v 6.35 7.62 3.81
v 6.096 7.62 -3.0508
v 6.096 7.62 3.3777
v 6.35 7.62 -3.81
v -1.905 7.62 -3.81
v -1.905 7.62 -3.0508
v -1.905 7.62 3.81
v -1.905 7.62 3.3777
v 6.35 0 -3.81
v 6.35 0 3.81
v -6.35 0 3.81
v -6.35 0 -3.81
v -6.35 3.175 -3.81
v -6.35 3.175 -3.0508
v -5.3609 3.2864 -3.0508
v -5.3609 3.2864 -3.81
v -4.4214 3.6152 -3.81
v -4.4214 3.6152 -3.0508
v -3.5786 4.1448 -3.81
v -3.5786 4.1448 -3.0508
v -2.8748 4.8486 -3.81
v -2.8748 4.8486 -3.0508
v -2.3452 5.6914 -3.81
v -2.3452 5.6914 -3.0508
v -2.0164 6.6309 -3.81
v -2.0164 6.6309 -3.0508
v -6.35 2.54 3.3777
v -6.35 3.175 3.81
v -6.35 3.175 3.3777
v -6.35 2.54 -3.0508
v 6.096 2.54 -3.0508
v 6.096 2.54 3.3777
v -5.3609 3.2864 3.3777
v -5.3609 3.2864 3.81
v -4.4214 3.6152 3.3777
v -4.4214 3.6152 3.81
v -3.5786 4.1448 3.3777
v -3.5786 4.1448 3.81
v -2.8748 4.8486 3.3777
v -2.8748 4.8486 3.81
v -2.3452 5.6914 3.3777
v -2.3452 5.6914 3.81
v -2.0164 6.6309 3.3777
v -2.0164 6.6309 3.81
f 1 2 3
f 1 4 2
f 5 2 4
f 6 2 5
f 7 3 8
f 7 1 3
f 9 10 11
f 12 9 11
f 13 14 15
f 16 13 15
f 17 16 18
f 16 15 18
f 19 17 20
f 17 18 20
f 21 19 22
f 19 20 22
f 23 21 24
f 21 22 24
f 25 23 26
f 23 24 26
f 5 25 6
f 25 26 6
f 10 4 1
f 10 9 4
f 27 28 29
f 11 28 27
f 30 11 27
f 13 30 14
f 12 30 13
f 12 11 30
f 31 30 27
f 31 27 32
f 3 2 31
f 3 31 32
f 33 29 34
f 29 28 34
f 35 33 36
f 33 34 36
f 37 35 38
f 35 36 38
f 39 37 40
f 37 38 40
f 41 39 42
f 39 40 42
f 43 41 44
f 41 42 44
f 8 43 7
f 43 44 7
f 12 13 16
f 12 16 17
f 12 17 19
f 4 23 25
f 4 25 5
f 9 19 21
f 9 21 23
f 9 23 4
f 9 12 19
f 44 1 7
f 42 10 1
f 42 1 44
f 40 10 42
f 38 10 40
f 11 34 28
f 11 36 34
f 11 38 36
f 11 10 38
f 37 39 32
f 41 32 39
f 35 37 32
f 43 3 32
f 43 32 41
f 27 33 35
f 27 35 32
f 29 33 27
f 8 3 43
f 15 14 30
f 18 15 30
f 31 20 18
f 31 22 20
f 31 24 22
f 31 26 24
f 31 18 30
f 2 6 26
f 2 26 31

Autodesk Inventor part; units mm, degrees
ref_plane "YZ Plane" through (0, 0, 0) normal (1, 0, 0) x (0, 1, 0)
ref_plane "XZ Plane" through (0, 0, 0) normal (0, 1, 0) x (-1, 0, 0)
ref_plane "XY Plane" through (0, 0, 0) normal (0, 0, 1) x (1, 0, 0)
sketch "Sketch1" plane through (0, 0, 0) normal (1, 0, 0) x (0, 1, 0)
  point P0 (0, 0)
sketch "Sketch2" plane through (0, 0, 0) normal (0, 1, 0) x (-1, 0, 0)
  line L0 (-6.35, 3.81) -> (6.35, 3.81)
  line L1 (6.35, 3.81) -> (6.35, -3.81)
  line L2 (6.35, -3.81) -> (-6.35, -3.81)
  line L3 (-6.35, -3.81) -> (-6.35, 3.81)
  line L4 (-6.35, 3.81) -> (6.35, -3.81) construction
  line L5 (6.35, 3.81) -> (-6.35, -3.81) construction
  point P0 (0, 0)
  dimension "d0" = 12.7
  dimension "d1" = 7.62
extrude "Extrusion1" add sketch "Sketch2" along normal blind 7.62
sketch "Sketch3" plane through (0, 7.62, 0) normal (0, 1, 0) x (1, 0, 0)
  point P0 (0, 0)
sketch "Sketch4" plane through (-6.35, 0, 3.81) normal (0, 0, 1) x (1, 0, 0)
  line L0 (0, 7.62) -> (12.7, 7.62) projected
  circle A0 centre (0, 7.62) radius 4.445
  point P0 (6.35, 0)
  dimension "d5" = 8.89
extrude "Extrusion2" cut sketch "Sketch4" against normal blind 12.7
sketch "Sketch5" plane through (0, 7.62, 0) normal (0, 1, 0) x (1, 0, 0)
  point P0 (0, 0)
sketch "Sketch6" plane through (0, 7.62, 0) normal (0, 1, 0) x (1, 0, 0)
  line L0 (6.096, -3.3777) -> (-6.604, -3.3777)
  line L1 (-6.604, -3.3777) -> (-6.604, 3.0508)
  line L2 (-6.604, 3.0508) -> (6.096, 3.0508)
  line L3 (6.096, 3.0508) -> (6.096, -3.3777)
  line L4 (6.35, -3.81) -> (6.35, 3.81) projected
  point P0 (0, 0)
  dimension "d10" = 12.7
  dimension "d11" = 0.254
extrude "Extrusion3" cut sketch "Sketch6" against normal blind 5.08
properties part number "ScoopBucket"
